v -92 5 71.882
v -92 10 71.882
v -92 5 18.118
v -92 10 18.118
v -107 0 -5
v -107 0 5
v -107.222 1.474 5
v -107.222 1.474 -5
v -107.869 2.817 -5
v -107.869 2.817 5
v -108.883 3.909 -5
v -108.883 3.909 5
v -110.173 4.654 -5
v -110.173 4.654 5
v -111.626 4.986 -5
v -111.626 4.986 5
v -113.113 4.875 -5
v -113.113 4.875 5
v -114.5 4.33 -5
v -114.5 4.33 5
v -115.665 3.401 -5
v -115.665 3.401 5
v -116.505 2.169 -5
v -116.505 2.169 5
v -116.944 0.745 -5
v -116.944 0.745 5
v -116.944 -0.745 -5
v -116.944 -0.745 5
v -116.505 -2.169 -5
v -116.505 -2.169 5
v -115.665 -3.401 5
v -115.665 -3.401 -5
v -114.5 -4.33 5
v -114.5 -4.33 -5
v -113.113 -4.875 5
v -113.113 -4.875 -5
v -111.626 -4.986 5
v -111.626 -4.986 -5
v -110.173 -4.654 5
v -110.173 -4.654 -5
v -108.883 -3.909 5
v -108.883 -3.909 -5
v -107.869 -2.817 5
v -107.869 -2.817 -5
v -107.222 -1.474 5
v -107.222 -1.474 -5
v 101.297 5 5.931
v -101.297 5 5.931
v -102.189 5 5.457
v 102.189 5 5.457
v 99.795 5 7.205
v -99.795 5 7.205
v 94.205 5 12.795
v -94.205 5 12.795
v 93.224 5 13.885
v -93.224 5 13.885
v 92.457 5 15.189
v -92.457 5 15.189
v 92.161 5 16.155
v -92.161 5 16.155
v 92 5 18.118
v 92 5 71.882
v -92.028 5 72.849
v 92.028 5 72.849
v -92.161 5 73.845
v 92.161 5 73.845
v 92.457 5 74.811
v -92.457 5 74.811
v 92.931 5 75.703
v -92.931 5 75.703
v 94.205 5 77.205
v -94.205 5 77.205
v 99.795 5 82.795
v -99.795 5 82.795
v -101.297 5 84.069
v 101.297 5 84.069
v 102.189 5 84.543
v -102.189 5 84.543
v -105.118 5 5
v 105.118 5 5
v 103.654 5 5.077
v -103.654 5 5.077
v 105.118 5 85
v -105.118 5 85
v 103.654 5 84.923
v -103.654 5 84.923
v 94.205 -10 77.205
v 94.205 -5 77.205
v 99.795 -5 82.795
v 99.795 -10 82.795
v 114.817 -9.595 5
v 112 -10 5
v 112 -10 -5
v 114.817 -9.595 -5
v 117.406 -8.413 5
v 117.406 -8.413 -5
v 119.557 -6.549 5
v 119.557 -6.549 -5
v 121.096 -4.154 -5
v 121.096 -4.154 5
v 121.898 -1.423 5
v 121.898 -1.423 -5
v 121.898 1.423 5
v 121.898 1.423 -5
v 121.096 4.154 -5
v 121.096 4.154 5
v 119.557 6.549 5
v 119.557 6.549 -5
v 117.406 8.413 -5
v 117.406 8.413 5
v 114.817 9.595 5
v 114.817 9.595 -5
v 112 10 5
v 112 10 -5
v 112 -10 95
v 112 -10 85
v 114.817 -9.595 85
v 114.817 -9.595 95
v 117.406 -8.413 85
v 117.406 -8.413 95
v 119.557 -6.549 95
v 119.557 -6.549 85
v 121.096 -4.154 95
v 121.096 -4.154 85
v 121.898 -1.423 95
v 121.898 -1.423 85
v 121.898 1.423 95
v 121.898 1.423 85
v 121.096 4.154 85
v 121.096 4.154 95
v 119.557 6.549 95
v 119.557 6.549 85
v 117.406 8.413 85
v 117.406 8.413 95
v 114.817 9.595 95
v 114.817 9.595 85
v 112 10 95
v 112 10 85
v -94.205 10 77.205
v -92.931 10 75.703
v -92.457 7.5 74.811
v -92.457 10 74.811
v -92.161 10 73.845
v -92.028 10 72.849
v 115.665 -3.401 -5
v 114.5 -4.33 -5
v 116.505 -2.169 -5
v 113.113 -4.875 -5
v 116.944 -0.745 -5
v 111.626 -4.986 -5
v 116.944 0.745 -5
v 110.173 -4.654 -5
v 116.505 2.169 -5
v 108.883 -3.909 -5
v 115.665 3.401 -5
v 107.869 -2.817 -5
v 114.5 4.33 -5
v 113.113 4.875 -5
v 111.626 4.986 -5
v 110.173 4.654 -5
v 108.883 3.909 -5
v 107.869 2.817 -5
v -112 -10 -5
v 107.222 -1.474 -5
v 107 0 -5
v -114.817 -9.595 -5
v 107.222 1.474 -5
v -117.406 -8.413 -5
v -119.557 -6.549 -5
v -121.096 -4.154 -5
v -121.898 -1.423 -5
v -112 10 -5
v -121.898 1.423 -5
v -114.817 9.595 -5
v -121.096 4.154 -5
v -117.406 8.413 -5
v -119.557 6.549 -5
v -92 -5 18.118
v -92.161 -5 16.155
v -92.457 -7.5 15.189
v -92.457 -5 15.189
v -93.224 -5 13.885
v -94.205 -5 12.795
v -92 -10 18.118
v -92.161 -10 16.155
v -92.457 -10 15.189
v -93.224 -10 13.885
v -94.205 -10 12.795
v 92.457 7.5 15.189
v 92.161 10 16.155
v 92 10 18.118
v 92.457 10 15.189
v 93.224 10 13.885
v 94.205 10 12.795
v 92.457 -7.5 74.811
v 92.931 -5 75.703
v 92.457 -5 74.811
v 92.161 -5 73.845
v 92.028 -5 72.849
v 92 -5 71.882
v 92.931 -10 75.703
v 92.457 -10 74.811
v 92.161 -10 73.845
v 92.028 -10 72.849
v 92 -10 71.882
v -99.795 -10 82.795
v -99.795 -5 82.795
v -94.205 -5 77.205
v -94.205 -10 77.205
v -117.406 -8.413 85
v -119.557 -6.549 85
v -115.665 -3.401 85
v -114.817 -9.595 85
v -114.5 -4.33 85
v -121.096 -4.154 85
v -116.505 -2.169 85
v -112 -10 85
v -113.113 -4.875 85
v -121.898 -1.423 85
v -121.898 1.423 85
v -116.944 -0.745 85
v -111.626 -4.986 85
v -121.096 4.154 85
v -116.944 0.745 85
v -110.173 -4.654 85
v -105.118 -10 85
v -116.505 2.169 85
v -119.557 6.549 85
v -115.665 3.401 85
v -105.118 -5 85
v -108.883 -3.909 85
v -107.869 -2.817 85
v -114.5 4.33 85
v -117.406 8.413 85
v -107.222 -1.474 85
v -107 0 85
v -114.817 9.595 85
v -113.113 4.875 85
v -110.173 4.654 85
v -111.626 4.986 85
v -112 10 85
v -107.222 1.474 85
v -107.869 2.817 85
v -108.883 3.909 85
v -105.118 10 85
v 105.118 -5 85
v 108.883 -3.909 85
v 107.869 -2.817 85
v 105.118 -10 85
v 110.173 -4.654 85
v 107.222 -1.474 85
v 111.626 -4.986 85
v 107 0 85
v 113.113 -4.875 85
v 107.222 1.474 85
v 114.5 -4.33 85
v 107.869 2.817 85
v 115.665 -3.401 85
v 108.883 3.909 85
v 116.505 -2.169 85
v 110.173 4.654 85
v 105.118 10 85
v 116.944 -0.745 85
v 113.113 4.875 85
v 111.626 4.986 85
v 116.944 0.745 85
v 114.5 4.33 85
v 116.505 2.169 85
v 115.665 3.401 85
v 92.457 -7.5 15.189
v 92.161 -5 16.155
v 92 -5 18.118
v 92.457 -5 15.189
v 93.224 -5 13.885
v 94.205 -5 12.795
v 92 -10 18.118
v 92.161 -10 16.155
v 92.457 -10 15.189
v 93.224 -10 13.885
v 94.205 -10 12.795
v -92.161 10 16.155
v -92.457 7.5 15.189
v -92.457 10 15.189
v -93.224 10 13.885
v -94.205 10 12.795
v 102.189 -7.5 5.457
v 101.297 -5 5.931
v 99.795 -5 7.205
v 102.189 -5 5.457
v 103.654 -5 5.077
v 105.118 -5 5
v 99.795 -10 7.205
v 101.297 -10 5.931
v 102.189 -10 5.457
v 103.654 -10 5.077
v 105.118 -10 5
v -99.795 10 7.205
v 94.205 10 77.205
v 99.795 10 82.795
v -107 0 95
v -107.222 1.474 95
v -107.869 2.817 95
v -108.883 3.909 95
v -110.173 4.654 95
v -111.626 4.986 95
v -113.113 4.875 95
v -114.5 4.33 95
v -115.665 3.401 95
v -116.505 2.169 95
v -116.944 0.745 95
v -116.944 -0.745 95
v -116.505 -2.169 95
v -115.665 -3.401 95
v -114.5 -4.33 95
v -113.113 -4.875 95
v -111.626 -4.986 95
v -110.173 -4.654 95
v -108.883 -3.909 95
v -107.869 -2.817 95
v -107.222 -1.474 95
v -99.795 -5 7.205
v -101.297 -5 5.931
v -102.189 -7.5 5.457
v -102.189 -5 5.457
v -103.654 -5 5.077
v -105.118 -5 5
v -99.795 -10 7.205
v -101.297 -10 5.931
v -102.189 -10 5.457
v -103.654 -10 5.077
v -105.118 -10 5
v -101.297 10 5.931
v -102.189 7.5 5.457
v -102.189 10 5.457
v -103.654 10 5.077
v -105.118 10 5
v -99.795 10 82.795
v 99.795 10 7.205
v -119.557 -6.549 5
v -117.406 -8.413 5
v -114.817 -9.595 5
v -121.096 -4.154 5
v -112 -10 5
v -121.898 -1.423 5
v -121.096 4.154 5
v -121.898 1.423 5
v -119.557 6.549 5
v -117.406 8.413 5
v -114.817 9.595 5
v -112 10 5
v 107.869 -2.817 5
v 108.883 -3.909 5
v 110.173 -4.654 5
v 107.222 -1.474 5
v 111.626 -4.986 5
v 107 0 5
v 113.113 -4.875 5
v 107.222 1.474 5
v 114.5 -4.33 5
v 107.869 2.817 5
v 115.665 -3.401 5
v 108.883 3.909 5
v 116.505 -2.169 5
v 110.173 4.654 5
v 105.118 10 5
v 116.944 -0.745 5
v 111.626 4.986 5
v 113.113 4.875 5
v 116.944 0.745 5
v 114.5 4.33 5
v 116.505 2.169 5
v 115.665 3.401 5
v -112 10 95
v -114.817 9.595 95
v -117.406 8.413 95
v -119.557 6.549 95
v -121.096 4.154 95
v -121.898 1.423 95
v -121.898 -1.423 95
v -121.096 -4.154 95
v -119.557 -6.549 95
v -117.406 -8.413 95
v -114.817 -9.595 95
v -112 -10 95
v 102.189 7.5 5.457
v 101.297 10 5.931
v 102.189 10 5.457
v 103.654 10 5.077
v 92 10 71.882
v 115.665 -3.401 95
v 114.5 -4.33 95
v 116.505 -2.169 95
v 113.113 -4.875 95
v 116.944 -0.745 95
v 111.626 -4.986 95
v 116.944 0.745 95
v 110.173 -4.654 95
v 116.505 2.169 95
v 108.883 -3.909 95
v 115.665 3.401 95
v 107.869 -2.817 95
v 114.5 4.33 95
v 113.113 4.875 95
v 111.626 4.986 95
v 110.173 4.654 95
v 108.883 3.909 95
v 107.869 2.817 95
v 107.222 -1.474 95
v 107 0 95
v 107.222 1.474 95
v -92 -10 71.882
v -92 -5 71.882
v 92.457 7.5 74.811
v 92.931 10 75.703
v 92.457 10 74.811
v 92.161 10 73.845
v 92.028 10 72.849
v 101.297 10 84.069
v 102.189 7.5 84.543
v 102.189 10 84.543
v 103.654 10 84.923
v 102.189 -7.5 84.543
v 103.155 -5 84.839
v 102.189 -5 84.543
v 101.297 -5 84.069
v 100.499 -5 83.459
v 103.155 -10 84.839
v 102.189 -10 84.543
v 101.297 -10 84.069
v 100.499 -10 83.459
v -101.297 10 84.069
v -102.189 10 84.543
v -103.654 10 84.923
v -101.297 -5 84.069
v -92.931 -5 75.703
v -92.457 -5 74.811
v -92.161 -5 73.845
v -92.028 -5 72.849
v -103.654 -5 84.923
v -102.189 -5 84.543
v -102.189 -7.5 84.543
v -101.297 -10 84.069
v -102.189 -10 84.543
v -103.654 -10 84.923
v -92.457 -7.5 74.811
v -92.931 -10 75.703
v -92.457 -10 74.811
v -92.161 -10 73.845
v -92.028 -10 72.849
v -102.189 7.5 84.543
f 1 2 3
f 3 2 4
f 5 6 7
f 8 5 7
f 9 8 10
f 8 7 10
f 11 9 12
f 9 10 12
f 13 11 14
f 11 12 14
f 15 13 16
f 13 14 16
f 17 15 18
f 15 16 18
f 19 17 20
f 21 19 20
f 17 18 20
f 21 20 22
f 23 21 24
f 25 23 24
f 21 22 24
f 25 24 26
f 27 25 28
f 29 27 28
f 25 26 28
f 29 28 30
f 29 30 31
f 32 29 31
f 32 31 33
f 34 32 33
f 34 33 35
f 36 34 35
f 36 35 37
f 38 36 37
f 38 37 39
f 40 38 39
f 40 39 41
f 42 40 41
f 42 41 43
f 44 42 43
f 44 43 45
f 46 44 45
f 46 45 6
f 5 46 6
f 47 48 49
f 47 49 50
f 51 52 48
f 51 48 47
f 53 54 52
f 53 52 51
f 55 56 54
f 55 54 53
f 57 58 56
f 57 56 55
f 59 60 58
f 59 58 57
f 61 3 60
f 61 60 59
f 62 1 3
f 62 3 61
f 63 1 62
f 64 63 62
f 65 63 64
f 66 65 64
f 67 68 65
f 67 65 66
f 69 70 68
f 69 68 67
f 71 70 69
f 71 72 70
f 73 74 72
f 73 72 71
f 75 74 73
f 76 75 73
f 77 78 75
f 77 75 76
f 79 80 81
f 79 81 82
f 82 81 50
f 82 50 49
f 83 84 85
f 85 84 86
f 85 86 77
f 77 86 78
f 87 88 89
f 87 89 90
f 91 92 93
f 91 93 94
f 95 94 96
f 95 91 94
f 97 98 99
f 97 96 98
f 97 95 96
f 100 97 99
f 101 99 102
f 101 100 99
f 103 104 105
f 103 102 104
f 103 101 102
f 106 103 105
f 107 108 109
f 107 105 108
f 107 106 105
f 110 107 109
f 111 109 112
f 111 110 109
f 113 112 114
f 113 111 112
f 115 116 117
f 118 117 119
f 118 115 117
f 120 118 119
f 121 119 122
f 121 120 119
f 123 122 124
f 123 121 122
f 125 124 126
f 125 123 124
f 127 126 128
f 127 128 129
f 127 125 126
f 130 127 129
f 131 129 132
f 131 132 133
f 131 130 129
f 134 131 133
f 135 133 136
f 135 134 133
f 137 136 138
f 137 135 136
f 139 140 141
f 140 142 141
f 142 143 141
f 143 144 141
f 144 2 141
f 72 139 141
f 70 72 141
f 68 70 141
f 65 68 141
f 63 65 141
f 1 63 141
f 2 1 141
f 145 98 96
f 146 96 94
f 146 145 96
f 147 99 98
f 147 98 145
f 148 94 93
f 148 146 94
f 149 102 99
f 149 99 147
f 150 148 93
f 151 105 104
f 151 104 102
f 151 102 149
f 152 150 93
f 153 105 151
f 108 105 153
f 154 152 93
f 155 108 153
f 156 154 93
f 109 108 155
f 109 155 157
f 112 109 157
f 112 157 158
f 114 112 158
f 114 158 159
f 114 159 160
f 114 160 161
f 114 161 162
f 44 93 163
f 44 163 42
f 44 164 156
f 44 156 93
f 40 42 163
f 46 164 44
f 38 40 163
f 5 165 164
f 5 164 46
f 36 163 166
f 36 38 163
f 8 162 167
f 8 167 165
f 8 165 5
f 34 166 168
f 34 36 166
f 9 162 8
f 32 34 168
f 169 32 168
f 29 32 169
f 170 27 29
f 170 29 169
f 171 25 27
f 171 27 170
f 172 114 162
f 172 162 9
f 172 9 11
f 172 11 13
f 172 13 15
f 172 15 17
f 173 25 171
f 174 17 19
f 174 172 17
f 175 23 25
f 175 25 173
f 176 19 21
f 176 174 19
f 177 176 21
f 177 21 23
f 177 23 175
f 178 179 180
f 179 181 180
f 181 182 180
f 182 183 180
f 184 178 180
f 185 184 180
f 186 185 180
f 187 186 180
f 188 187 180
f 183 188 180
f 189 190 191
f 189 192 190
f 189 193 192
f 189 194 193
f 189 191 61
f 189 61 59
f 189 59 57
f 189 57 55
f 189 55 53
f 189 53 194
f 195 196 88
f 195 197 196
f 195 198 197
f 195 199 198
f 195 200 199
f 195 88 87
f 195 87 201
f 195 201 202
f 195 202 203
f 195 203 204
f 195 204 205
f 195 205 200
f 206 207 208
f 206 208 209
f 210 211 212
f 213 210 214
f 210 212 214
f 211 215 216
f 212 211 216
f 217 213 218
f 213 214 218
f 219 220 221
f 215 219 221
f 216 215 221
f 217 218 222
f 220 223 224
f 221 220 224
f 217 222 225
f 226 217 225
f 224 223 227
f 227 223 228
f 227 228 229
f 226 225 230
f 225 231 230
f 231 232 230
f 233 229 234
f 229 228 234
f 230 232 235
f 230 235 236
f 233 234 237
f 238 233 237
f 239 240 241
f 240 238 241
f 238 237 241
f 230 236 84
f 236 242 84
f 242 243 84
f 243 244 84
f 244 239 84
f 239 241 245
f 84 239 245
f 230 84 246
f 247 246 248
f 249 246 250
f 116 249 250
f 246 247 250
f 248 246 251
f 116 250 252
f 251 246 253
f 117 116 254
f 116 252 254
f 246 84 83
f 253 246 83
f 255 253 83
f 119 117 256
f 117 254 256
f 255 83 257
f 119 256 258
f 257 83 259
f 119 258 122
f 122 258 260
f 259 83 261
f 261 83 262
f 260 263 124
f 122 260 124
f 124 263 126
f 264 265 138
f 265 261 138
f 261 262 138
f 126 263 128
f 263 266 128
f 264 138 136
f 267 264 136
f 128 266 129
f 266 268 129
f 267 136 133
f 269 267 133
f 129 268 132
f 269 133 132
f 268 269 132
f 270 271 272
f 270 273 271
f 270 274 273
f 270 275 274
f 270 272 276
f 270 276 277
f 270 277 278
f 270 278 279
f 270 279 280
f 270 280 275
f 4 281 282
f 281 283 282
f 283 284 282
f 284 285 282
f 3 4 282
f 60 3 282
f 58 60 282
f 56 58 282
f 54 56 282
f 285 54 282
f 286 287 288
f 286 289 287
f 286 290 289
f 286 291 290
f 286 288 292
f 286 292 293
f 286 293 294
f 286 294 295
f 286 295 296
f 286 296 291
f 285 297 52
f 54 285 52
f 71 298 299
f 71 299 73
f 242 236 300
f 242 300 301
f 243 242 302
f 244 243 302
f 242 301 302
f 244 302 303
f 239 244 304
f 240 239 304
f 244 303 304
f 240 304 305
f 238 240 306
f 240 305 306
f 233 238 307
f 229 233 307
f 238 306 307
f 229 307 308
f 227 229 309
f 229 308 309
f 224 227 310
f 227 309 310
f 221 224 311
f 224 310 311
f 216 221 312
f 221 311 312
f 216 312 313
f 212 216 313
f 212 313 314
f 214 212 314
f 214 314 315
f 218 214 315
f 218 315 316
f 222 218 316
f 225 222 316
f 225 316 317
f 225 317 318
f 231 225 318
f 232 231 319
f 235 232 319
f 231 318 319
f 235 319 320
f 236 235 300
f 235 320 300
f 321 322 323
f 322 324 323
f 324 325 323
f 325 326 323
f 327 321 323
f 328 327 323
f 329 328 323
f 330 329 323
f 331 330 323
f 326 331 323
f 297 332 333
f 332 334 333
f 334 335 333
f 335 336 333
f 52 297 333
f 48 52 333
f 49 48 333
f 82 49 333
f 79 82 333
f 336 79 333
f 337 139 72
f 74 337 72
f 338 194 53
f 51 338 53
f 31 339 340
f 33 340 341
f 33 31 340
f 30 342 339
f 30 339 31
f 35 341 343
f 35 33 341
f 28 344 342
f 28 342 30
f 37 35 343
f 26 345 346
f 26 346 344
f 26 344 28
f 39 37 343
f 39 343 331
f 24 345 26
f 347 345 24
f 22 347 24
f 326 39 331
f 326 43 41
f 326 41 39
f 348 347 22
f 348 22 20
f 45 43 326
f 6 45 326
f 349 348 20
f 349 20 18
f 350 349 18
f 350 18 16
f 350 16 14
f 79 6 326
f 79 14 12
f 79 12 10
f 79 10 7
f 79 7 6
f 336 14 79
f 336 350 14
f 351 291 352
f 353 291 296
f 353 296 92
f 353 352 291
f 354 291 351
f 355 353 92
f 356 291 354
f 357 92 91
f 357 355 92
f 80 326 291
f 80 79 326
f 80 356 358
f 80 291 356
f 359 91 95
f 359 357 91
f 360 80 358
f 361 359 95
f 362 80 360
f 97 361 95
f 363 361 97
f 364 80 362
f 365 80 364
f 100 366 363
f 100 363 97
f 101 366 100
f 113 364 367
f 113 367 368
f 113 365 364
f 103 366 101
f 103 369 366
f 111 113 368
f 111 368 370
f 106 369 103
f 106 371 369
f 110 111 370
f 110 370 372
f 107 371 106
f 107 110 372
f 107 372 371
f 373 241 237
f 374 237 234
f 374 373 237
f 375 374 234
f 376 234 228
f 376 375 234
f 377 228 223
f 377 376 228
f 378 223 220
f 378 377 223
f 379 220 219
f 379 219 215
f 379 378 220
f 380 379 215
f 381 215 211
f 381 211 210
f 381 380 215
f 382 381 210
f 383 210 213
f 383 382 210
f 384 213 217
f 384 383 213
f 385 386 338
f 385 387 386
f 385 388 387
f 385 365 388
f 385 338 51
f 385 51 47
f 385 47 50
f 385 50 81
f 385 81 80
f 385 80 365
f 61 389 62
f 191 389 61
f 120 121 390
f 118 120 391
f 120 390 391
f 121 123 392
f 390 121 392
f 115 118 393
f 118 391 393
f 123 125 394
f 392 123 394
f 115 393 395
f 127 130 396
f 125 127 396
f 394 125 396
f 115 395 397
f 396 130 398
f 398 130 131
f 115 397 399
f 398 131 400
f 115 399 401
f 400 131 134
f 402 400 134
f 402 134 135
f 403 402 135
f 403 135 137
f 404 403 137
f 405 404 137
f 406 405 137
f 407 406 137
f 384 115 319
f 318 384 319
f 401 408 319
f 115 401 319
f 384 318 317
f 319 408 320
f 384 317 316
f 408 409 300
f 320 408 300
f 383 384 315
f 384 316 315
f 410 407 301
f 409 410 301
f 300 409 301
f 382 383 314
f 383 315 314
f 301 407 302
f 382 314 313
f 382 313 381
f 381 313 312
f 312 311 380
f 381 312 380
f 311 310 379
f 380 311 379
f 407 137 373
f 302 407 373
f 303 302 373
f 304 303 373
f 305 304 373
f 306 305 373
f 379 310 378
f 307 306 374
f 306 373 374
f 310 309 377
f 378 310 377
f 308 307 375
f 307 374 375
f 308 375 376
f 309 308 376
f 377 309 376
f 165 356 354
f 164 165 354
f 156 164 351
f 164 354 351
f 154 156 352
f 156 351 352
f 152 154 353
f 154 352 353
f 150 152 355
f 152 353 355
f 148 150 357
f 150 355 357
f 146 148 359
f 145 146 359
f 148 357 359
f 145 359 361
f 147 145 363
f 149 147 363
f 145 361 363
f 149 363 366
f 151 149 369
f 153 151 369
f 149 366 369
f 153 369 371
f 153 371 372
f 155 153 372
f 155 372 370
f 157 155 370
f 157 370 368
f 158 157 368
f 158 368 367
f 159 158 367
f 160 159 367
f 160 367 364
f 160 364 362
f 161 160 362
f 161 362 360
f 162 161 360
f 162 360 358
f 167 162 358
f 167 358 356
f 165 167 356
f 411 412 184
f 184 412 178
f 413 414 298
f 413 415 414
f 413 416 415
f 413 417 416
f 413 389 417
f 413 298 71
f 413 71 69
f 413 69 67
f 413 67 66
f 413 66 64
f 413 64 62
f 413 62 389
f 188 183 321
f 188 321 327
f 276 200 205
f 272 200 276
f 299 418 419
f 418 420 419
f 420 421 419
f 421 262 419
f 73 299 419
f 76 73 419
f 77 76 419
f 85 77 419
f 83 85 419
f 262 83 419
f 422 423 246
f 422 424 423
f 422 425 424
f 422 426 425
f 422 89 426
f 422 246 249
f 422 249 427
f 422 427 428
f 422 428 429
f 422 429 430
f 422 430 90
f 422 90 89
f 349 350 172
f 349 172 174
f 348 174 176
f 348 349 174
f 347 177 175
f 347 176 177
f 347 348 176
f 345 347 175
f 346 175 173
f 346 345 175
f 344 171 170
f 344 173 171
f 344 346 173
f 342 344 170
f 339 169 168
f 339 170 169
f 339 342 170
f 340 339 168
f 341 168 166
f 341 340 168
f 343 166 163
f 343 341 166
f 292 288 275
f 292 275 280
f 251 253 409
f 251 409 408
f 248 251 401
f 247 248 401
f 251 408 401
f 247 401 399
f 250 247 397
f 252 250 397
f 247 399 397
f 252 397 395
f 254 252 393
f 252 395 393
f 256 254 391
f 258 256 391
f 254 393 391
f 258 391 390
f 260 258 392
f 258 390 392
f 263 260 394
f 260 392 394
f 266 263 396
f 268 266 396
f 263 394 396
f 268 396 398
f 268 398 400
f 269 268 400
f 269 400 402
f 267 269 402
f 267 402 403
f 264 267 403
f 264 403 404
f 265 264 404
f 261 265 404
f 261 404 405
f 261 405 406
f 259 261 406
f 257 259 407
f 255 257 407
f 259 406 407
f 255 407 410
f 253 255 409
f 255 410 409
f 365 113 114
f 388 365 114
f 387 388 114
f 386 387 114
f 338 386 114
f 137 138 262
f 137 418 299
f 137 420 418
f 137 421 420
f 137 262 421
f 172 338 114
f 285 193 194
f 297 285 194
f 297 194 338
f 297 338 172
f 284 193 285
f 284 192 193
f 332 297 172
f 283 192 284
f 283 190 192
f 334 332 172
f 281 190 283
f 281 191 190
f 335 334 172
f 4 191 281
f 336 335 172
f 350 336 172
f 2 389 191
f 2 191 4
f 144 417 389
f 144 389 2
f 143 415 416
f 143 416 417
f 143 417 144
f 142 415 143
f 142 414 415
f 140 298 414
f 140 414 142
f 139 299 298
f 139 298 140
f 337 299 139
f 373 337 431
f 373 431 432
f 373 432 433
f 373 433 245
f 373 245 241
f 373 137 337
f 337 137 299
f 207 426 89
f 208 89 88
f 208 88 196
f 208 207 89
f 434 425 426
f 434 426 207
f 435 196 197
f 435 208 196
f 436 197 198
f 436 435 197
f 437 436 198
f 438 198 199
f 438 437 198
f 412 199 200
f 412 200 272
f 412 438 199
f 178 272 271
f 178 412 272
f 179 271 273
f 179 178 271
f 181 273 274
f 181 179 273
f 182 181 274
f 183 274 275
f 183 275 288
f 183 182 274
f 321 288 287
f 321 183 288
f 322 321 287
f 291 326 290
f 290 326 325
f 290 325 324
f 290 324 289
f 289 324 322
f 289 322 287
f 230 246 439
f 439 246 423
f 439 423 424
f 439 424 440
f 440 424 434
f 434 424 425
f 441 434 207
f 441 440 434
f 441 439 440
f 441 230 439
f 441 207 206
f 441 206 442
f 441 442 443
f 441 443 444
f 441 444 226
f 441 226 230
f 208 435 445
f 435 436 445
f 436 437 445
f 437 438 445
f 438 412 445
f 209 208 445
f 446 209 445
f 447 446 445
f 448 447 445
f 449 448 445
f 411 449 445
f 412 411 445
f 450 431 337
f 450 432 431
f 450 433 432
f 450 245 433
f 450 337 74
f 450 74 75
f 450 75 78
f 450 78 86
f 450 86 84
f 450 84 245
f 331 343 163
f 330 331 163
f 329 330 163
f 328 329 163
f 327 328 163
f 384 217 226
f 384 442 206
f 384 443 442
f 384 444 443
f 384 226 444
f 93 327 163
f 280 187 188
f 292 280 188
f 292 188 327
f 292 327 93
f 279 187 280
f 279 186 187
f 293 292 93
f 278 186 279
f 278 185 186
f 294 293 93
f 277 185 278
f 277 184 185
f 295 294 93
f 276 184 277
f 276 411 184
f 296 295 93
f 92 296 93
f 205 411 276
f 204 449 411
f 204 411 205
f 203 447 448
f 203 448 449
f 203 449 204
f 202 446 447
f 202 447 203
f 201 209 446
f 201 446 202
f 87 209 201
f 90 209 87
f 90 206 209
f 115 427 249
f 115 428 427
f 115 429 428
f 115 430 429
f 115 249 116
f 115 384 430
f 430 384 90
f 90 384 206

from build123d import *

# Parameters (mm, degrees)
SKETCH1_R           = 5
BOSS_EXTRUDE1_DEPTH = 5
BOSS_EXTRUDE2_DEPTH = 40
SKETCH4_W           = 48.223256465
SKETCH4_H           = 80
CUT_EXTRUDE1_DEPTH  = 40
CHAMFER1_SIZE       = 10


with BuildPart() as part:
    # Sketch1 → Boss-Extrude1 (new, symmetric)
    with BuildSketch(Plane.XY):
        with BuildLine():
            Line((-112, 10), (112, 10))
            ThreePointArc((112, 10), (122, 0), (112, -10))
            Line((112, -10), (-112, -10))
            ThreePointArc((-112, -10), (-122, 0), (-112, 10))
        make_face()
        with Locations((-112, 0)):
            Circle(SKETCH1_R, mode=Mode.SUBTRACT)
        with Locations(Location((112, 0, 0), (0, 0, 180))):
            Circle(SKETCH1_R, mode=Mode.SUBTRACT)
    extrude(amount=BOSS_EXTRUDE1_DEPTH, both=True)

    # Sketch2 → Boss-Extrude2 (add)
    with BuildSketch(Plane.XY.offset(5)):
        with BuildLine():
            Line((-112, -10), (112, -10))
            ThreePointArc((112, -10), (122, 0), (112, 10))
            Line((112, 10), (-112, 10))
            ThreePointArc((-112, 10), (-122, 0), (-112, -10))
        make_face()
        with BuildLine():
            Line((-112, -5), (112, -5))
            ThreePointArc((112, -5), (117, 0), (112, 5))
            Line((112, 5), (-112, 5))
            ThreePointArc((-112, 5), (-117, 0), (-112, -5))
        make_face(mode=Mode.SUBTRACT)
    extrude(amount=BOSS_EXTRUDE2_DEPTH)

    # Mirror1: part across plane


with BuildPart() as part_1:
    add(part.part)
    add(part.part.mirror(Plane(origin=(-112, 0, 45), x_dir=(1, 0, 0), z_dir=(0, 0, 1))))

    # Sketch4 → Cut-Extrude1 (cut)
    with BuildSketch(Plane(origin=(0, 10, 0), x_dir=(1, 0, 0), z_dir=(0, 1, 0))):
        with Locations((-116.111628233, -45)):
            Rectangle(SKETCH4_W, SKETCH4_H)
        with Locations((116.111628233, -45)):
            Rectangle(SKETCH4_W, SKETCH4_H)
    extrude(amount=-CUT_EXTRUDE1_DEPTH, mode=Mode.SUBTRACT)

    # Chamfer1
    chamfer1_edges = [part_1.edges().sort_by_distance(p)[0] for p in [
        (-92, 7.5, 5),
        (92, -7.5, 5),
        (92, 7.5, 5),
        (92, -7.5, 85),
        (92, 7.5, 85),
        (-92, -7.5, 85),
        (-92, 7.5, 85),
        (-92, -7.5, 5),
    ]]
    chamfer(chamfer1_edges, length=CHAMFER1_SIZE)

    # Fillet1
    # a fillet whose section is not a circle: 8 mm, written as the material it adds along each edge (its section moved 0.00015 mm through the faces so that the kernel can cut it)
    with BuildSketch(Plane(origin=(-92, -5, 15), x_dir=(4.5266504249621425e-05, 0, 0.9999999989754718), z_dir=(0, -1, 0)), Plane(origin=(-102, -5, 5), x_dir=(0.7071387887142107, 0, 0.7070747722099827), z_dir=(0, -1, 0)), Plane(origin=(-92, -5, 75), x_dir=(-0.707074772209981, 0, 0.7071387887142122), z_dir=(0, -1, 0)), Plane(origin=(-92, 10, 75), x_dir=(-0.707074772209981, 0, 0.7071387887142122), z_dir=(0, -1, 0)), Plane(origin=(102, 10, 85), x_dir=(-0.7071387887142122, 0, -0.707074772209981), z_dir=(0, -1, 0)), Plane(origin=(-102, 10, 5), x_dir=(0.7071387887142107, 0, 0.7070747722099827), z_dir=(0, -1, 0)), Plane(origin=(-92, 10, 15), x_dir=(4.5266504249621425e-05, 0, 0.9999999989754718), z_dir=(0, -1, 0))) as fillet1_piece_1:
        with BuildLine():
            add(Edge.make_bspline([(3.313708502, 0), (2.707126731, -2.7458e-05), (2.10054496, -5.4916e-05), (0.747296328, 0.113741147), (-0.448046284, 0.608804877), (-1.485482876, 1.485136275), (-1.914420376, 1.914034943), (-2.343357875, 2.342933611)], knots=[0, 0, 0, 0, 0, 0, 0.5, 0.5, 1, 1, 1, 1, 1, 1], degree=5))
            Line((-2.343357875, 2.342933611), (-2.456489839, 2.229791405))
            ThreePointArc((-2.456489839, 2.229791405), (-1.284757871, 1.058377635), (-0.113131964, -0.113142206))
            Line((-0.113131964, -0.113142206), (7.243e-06, -0.16))
            ThreePointArc((7.243e-06, -0.16), (1.65686149, -0.159925), (3.313715745, -0.16))
            Line((3.313715745, -0.16), (3.313708502, 0))
        make_face()
    extrude(amount=5)
    with BuildSketch(Plane(origin=(92, -5, 15), x_dir=(-4.526650424962133e-05, 0, 0.9999999989754718), z_dir=(0, -1, 0)), Plane(origin=(92, -5, 75), x_dir=(0.707074772209981, 0, 0.7071387887142122), z_dir=(0, -1, 0)), Plane(origin=(102, -5, 85), x_dir=(0.9999999989754718, 0, 4.526650424962133e-05), z_dir=(0, -1, 0)), Plane(origin=(-102, -5, 85), x_dir=(0.7071387887142122, 0, -0.707074772209981), z_dir=(0, -1, 0)), Plane(origin=(102, -5, 5), x_dir=(-0.7071387887142124, 0, 0.7070747722099809), z_dir=(0, -1, 0)), Plane(origin=(-102, 10, 85), x_dir=(0.7071387887142122, 0, -0.707074772209981), z_dir=(0, -1, 0)), Plane(origin=(92, 10, 75), x_dir=(0.707074772209981, 0, 0.7071387887142122), z_dir=(0, -1, 0)), Plane(origin=(92, 10, 15), x_dir=(-4.526650424962133e-05, 0, 0.9999999989754718), z_dir=(0, -1, 0)), Plane(origin=(102, 10, 5), x_dir=(-0.7071387887142124, 0, 0.7070747722099809), z_dir=(0, -1, 0))) as fillet1_piece_2:
        with BuildLine():
            add(Edge.make_bspline([(3.313708502, 0), (2.707126731, 2.7458e-05), (2.10054496, 5.4916e-05), (0.747296328, -0.113741147), (-0.448046284, -0.608804877), (-1.485482876, -1.485136275), (-1.914420376, -1.914034943), (-2.343357875, -2.342933611)], knots=[0, 0, 0, 0, 0, 0, 0.5, 0.5, 1, 1, 1, 1, 1, 1], degree=5))
            Line((-2.343357875, -2.342933611), (-2.456489839, -2.229791405))
            ThreePointArc((-2.456489839, -2.229791405), (-1.284757871, -1.058377635), (-0.113131964, 0.113142206))
            Line((-0.113131964, 0.113142206), (7.243e-06, 0.16))
            ThreePointArc((7.243e-06, 0.16), (1.65686149, 0.159925), (3.313715745, 0.16))
            Line((3.313715745, 0.16), (3.313708502, 0))
        make_face()
    extrude(amount=5)


solid = part_1.part
